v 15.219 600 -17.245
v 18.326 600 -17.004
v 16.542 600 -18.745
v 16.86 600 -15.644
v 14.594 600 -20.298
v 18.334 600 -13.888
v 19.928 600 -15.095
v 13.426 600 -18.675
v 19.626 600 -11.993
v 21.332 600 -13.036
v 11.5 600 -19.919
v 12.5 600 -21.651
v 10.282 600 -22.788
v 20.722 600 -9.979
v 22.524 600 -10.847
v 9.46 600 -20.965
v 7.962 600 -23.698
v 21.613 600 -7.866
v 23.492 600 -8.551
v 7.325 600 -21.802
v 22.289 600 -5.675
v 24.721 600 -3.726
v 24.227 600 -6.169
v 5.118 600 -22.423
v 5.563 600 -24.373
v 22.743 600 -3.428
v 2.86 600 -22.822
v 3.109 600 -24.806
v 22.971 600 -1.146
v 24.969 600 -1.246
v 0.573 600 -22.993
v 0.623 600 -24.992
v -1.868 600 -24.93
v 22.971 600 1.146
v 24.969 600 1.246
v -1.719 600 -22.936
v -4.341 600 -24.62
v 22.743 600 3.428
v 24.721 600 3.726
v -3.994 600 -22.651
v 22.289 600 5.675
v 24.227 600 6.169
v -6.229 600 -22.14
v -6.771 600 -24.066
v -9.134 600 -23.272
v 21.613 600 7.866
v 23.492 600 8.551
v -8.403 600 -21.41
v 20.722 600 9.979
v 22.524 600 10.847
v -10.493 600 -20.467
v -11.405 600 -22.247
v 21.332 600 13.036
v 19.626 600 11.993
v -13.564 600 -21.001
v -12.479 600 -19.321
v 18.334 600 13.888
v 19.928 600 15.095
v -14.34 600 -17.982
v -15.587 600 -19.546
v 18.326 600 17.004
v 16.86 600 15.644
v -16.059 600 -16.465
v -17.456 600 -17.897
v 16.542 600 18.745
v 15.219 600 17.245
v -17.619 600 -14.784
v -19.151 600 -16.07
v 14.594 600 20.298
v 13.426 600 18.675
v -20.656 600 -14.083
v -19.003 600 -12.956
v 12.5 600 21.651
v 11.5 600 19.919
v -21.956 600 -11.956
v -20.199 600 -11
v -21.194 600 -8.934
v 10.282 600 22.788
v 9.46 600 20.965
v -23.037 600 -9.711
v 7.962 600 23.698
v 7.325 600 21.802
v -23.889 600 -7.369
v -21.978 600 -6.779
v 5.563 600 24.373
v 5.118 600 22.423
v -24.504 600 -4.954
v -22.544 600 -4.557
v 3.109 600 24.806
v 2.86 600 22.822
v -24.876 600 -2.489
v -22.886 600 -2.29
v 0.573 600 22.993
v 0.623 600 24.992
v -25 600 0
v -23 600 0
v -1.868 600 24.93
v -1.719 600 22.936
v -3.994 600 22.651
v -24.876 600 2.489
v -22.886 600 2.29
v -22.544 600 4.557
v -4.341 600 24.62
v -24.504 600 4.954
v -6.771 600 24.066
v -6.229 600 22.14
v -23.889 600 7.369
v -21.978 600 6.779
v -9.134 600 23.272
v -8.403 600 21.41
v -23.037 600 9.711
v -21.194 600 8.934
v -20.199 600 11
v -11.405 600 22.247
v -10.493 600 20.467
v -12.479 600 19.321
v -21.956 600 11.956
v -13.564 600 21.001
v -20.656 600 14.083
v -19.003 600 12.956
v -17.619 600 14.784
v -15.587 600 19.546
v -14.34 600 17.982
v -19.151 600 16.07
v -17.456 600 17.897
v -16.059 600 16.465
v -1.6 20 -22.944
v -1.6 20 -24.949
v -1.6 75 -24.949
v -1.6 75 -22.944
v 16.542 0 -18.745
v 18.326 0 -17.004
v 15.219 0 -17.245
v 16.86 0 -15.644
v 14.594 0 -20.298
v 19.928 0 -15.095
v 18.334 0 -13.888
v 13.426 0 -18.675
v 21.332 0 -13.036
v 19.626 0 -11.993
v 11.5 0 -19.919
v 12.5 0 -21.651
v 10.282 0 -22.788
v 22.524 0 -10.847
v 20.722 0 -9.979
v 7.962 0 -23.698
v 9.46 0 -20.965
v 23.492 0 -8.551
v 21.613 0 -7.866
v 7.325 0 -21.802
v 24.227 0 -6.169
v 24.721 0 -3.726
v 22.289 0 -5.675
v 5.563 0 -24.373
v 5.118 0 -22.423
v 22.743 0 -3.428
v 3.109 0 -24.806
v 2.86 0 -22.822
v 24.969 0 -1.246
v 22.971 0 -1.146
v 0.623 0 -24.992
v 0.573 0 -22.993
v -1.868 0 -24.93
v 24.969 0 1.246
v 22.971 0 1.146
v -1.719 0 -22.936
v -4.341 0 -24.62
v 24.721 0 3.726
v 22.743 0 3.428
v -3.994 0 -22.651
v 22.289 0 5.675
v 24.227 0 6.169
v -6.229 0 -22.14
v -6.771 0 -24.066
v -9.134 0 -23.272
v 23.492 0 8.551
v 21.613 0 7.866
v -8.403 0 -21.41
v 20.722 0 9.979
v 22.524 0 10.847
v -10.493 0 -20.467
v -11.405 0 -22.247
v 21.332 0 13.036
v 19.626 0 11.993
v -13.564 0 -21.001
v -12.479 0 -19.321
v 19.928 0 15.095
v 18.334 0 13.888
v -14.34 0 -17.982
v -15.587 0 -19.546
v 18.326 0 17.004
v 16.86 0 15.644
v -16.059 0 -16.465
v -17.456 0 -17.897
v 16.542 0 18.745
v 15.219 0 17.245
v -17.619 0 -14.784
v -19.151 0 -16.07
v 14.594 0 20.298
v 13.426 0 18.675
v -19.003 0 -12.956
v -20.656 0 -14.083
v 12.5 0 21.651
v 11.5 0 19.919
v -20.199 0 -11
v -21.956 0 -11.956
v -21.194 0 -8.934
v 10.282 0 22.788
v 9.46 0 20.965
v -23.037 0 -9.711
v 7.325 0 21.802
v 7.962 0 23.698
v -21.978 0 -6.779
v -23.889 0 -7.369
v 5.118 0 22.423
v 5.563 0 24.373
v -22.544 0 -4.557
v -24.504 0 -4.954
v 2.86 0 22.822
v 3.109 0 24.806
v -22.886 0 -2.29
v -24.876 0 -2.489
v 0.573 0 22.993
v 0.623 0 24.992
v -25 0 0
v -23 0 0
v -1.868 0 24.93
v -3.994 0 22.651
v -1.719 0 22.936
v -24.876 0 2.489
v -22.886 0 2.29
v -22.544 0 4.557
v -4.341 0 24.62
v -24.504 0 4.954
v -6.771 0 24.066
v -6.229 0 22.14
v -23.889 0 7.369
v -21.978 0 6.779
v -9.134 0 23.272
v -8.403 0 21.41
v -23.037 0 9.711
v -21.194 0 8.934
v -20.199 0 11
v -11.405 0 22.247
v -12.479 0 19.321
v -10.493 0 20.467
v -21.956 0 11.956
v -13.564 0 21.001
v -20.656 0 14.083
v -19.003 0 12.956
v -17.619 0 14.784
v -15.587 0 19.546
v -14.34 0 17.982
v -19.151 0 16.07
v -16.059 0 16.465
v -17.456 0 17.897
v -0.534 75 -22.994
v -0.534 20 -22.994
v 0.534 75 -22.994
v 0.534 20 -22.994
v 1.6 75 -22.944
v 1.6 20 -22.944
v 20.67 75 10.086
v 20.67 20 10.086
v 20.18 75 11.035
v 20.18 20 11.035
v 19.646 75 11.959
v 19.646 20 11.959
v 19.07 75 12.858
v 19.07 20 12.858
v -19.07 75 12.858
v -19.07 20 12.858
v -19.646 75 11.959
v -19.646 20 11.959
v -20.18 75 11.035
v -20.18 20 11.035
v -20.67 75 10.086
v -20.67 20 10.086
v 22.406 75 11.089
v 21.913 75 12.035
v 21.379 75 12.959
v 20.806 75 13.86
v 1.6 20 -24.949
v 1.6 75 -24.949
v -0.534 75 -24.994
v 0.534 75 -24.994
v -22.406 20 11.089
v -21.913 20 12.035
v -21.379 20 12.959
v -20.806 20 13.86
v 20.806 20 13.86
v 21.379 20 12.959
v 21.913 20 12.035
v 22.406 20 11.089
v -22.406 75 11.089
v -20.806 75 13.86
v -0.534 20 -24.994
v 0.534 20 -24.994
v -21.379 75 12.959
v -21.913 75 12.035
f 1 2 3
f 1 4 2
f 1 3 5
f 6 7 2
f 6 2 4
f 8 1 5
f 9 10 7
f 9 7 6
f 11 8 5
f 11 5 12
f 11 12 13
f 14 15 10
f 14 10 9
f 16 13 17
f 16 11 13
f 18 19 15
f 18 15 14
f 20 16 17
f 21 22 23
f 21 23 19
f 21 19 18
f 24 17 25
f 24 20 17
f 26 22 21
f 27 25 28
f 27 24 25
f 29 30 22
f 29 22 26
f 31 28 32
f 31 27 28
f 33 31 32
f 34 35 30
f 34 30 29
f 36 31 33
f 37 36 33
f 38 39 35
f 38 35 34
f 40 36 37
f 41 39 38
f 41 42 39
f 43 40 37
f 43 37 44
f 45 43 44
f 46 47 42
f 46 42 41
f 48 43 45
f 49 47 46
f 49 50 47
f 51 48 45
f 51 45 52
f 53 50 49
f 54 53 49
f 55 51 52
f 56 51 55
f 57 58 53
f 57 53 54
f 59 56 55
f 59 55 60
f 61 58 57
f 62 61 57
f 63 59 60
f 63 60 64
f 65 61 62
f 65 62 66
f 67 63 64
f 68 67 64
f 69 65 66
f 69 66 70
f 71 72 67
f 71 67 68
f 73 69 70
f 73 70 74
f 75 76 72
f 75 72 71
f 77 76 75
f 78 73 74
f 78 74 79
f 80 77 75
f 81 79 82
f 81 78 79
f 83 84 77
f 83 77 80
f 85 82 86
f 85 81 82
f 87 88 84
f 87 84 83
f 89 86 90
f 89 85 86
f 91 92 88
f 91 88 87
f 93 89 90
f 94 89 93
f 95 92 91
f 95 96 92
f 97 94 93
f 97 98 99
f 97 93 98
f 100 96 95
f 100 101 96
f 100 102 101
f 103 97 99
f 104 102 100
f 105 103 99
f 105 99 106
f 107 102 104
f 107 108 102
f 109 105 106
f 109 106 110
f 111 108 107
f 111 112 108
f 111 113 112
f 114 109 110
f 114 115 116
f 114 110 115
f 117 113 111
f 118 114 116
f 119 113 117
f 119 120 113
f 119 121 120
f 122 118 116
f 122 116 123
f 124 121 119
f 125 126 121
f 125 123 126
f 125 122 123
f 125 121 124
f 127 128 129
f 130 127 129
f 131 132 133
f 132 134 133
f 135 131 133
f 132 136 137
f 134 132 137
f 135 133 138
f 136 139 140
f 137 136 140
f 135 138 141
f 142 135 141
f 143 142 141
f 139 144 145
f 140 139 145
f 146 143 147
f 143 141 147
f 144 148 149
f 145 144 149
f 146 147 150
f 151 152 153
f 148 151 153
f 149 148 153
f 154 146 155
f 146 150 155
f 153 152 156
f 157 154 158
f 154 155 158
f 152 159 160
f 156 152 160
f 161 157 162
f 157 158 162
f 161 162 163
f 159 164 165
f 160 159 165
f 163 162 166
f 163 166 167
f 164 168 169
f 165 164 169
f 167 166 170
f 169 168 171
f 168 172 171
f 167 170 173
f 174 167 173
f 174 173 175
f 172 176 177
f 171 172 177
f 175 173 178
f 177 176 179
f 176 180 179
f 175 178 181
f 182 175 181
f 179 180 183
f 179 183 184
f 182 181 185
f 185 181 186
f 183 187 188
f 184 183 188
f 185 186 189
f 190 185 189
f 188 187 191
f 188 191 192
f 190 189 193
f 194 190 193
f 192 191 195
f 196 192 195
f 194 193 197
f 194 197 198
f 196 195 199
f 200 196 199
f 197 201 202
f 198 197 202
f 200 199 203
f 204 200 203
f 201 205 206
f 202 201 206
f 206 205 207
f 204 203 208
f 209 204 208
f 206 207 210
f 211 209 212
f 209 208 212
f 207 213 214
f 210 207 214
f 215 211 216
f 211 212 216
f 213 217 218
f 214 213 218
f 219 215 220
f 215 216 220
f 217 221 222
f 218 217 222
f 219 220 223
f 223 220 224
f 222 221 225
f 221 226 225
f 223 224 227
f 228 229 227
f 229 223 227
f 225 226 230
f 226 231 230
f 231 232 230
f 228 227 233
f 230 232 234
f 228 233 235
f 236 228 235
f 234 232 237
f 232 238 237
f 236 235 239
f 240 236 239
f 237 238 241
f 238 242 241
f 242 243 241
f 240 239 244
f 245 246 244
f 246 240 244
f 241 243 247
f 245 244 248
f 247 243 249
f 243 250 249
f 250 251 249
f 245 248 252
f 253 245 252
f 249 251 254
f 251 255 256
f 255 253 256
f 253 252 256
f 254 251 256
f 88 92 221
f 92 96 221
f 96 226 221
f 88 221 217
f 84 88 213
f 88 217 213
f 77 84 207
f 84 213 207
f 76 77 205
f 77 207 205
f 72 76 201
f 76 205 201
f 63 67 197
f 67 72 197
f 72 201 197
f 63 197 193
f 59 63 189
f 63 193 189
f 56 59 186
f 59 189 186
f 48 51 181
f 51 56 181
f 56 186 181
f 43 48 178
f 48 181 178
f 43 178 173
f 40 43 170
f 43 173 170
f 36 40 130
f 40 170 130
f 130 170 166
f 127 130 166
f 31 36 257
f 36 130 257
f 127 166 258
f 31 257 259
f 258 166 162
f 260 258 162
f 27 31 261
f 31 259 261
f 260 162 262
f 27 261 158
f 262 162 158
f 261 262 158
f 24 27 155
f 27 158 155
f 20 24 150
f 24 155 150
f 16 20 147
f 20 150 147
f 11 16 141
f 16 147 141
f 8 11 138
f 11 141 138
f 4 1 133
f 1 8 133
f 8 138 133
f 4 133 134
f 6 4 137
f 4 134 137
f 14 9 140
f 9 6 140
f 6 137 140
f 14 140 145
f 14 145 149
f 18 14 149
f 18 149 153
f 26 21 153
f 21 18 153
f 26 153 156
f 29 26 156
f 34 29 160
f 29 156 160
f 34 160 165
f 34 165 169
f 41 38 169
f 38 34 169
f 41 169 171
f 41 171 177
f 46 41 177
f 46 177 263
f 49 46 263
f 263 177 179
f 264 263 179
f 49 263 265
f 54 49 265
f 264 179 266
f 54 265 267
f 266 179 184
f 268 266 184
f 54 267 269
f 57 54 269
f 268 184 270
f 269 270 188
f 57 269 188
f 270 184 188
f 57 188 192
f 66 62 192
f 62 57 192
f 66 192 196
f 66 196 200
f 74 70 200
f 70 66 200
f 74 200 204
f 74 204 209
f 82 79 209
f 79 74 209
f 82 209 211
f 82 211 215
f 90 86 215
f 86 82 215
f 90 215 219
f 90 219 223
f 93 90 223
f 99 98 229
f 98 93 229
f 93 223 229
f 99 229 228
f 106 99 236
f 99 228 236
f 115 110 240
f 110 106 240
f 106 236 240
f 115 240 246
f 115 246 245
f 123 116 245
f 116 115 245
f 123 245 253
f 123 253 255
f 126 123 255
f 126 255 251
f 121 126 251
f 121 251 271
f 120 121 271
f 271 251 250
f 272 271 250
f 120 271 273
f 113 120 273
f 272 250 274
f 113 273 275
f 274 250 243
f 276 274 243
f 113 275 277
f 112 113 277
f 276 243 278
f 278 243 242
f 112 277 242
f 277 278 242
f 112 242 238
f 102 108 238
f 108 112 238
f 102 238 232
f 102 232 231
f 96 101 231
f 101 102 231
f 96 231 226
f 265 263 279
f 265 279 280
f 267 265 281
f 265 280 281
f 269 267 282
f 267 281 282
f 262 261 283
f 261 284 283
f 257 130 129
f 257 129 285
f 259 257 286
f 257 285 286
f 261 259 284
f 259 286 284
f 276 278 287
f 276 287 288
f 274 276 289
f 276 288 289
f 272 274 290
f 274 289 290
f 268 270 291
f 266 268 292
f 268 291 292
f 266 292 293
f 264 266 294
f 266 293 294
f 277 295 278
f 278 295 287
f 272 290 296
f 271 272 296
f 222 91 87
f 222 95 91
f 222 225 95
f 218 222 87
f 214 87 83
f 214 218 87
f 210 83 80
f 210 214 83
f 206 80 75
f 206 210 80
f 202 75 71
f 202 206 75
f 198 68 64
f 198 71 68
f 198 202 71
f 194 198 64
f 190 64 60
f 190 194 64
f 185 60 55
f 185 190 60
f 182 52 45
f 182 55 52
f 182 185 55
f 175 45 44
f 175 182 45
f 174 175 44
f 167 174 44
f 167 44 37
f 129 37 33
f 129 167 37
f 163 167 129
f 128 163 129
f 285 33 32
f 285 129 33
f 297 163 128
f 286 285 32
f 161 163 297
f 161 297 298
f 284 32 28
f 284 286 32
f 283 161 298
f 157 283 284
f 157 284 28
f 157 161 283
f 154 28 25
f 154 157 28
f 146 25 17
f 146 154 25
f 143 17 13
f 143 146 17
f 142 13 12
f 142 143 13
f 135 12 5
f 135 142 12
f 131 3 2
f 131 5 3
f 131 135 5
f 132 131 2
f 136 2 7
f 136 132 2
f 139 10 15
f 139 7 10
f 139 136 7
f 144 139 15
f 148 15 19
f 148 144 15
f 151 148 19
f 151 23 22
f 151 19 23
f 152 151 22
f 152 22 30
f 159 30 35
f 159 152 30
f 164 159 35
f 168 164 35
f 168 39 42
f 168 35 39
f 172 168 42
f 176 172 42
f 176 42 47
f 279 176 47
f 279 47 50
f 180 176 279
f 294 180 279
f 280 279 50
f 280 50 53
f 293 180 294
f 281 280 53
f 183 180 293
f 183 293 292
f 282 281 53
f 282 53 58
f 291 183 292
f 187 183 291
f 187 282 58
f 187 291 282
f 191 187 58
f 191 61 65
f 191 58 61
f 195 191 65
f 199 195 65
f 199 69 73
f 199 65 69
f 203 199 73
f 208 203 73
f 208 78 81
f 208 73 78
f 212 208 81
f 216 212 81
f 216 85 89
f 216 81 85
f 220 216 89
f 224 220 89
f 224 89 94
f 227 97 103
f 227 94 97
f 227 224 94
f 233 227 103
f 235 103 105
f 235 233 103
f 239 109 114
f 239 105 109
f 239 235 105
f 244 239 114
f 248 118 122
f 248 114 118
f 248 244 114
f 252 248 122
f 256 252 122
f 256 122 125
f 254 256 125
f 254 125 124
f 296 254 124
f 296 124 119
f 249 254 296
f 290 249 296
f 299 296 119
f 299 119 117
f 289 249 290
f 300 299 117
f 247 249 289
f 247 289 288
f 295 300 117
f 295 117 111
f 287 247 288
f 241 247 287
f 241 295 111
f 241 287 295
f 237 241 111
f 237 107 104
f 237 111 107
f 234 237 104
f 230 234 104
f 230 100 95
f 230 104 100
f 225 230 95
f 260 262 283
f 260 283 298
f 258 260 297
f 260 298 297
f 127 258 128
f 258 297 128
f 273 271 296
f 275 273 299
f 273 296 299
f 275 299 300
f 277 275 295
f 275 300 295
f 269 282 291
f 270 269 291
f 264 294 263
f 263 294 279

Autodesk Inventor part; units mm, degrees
ref_plane "YZ Plane" through (0, 0, 0) normal (1, 0, 0) x (0, 1, 0)
ref_plane "XZ Plane" through (0, 0, 0) normal (0, 1, 0) x (-1, 0, 0)
sketch "Sketch2" plane through (0, 0, 0) normal (0, 1, 0) x (-1, 0, 0)
  circle A0 centre (0, 0) radius 25
  circle A1 centre (0, 0) radius 23
  dimension "d0" = 50
  dimension "d1" = 46
extrude "Extrusion1" add sketch "Sketch2" along normal blind 600
ref_plane "Work Plane1" through (0, 0, -25) normal (0, 0, 1) x (1, 0, 0)
sketch "Sketch3" plane through (0, 0, -25) normal (0, 0, 1) x (1, 0, 0)
  line L0 (-25, 0) -> (-25, 600) projected
  line L1 (25, 0) -> (-25, 0) projected
  line L2 (1.6, 20) -> (-1.6, 20)
  line L3 (-1.6, 20) -> (-1.6, 75)
  line L4 (-1.6, 75) -> (1.6, 75)
  line L5 (1.6, 75) -> (1.6, 20)
  point P0 (0, 0)
  point P1 (0, 75)
  dimension "d4" = 600
  dimension "d5" = 50
  dimension "d6" = 3.2
  dimension "d7" = 55
  dimension "d8" = 20
  dimension "d9" = 25
extrude "Extrusion2" cut sketch "Sketch3" along normal mid plane 10
sketch "Sketch4" plane through (0, 0, 0) normal (0, 1, 0) x (-1, 0, 0)
  circle A0 centre (0, 0) radius 25 projected
  line L0 (0, -25) -> (-21.65, 12.4989) construction
  line L1 (-21.65, 12.4989) -> (21.65, 12.4989) construction
  line L2 (21.65, 12.4989) -> (0, -25) construction
  line L3 (-17.6606, 19.4109) -> (-26.5815, 3.9594) construction
  line L4 (20.7261, 14.1013) -> (22.5717, 10.9047) construction
  dimension "d12" = 43.3
  dimension "d13" = 43.3
  dimension "d14" = 43.3
pattern_circular "Circular Pattern1" count 3 over 360 about axis through (0, 0, 0) along (0, 1, 0) of "Extrusion2"
ref_plane "Work Plane14" through (0, 230, 0) normal (0, -1, 0) x (1, 0, 0)
split_face "Split7"
equation "\"d12\" = d14"
equation "\"d14\" = d13"
